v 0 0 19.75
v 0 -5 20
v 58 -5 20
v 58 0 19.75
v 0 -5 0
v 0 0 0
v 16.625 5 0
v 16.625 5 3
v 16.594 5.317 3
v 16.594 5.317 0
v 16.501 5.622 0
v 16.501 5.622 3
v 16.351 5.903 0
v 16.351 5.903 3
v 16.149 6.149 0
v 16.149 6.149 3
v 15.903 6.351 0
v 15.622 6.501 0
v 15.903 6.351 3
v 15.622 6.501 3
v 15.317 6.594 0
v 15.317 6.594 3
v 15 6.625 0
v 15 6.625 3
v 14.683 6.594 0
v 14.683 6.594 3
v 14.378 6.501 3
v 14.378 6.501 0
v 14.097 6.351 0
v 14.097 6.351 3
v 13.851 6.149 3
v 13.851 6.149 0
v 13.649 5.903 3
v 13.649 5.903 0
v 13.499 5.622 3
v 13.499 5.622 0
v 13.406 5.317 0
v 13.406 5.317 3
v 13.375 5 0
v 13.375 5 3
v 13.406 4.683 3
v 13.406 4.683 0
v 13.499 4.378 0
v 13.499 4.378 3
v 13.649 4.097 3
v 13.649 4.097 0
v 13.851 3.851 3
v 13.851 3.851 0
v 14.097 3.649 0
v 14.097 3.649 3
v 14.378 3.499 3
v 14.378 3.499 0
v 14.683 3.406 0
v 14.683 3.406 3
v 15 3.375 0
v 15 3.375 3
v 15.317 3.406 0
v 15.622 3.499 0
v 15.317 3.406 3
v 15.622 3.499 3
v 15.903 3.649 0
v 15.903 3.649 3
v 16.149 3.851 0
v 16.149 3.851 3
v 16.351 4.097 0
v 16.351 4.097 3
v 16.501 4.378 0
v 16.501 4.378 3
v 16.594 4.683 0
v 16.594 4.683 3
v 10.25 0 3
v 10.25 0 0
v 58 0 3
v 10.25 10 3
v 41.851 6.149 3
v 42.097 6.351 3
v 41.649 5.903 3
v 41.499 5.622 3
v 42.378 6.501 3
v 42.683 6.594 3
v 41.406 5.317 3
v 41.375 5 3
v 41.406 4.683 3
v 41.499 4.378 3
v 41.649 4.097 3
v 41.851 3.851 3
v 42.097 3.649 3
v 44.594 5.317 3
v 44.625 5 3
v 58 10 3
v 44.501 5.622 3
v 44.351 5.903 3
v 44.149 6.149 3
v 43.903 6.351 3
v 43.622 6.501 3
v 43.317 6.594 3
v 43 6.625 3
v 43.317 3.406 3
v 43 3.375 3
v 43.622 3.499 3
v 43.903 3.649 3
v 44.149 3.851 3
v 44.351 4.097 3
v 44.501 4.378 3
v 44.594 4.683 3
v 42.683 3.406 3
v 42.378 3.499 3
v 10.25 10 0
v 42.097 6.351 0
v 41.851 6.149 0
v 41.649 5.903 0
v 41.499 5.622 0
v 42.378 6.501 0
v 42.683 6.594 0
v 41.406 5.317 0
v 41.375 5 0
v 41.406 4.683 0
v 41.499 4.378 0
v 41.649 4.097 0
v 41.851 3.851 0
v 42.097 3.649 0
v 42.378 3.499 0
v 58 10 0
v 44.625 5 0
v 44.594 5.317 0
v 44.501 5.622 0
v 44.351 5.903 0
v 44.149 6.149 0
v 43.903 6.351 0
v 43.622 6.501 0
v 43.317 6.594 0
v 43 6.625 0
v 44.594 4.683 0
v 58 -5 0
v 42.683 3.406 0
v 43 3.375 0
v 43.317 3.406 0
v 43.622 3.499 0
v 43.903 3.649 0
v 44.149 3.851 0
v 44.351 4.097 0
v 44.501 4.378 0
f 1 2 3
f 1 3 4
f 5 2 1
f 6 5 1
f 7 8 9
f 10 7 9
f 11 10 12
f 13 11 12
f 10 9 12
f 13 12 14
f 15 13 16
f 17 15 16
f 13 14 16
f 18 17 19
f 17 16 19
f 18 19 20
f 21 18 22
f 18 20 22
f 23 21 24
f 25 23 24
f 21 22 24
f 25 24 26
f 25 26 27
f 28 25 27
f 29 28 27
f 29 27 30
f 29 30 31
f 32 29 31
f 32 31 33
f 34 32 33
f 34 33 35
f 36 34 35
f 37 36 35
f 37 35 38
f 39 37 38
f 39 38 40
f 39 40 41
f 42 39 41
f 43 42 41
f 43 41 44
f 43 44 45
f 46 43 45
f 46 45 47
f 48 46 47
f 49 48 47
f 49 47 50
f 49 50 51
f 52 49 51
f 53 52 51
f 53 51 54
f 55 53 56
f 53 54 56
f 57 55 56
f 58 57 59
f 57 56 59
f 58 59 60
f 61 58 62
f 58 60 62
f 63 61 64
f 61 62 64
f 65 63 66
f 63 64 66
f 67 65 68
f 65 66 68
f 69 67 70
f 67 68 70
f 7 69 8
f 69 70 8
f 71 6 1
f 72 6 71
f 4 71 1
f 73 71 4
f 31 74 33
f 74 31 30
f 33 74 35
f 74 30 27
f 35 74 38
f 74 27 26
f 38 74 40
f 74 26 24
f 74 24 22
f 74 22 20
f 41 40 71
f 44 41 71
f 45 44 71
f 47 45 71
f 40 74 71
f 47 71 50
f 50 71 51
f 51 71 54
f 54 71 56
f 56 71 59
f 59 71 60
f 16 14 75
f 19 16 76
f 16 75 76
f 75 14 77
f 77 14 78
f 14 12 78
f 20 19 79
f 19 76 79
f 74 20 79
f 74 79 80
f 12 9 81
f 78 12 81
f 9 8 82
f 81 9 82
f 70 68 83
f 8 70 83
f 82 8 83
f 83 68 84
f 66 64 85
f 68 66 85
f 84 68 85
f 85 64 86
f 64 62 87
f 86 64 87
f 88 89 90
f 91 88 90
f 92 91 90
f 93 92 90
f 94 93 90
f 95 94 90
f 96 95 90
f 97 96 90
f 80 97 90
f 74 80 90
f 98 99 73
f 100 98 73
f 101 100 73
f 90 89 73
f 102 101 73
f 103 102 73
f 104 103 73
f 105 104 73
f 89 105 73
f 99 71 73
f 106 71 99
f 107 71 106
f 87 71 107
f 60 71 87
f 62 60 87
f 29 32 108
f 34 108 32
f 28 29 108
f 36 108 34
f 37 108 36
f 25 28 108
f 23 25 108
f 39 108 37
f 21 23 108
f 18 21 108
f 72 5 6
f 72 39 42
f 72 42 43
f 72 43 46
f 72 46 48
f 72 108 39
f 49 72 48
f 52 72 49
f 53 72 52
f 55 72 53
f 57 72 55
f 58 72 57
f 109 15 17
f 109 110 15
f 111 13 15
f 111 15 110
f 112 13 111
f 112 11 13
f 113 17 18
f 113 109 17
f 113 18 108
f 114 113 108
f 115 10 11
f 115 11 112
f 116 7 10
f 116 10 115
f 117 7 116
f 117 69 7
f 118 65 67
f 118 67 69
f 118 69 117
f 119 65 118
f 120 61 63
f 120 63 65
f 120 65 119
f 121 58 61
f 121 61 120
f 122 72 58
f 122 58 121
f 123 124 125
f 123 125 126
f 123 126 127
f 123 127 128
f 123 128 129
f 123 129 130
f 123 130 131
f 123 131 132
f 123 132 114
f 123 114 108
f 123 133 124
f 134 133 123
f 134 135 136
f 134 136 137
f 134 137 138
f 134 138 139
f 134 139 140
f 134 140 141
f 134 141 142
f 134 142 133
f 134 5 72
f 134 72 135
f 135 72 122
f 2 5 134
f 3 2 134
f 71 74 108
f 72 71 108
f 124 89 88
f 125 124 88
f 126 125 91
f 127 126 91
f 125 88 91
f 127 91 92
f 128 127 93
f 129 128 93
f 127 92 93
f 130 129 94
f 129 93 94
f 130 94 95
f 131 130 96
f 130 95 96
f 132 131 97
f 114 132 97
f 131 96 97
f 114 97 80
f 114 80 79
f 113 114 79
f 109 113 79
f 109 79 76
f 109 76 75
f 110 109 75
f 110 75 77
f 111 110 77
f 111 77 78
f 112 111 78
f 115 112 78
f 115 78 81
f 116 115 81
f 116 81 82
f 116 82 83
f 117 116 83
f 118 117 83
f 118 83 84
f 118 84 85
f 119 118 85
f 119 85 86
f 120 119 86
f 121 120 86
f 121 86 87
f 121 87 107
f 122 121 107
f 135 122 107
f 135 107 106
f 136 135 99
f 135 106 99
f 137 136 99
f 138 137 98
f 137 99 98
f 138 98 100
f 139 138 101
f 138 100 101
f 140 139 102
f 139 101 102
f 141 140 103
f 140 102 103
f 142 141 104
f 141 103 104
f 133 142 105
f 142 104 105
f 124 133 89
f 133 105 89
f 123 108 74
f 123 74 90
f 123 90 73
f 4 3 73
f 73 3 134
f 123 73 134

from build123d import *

# Parameters (mm, degrees)
ESQUISSE1_W             = 58
ESQUISSE1_H             = 5
BOSS_EXTRU_1_DEPTH      = 20
ESQUISSE3_W             = 47.75
ESQUISSE3_H             = 3
BOSS_EXTRU_2_DEPTH      = 10
ESQUISSE4_R             = 1.625
ENL_V_MAT_EXTRU_1_DEPTH = 10
ENL_V_MAT_EXTRU_2_DEPTH = 59


with BuildPart() as part:
    # Esquisse1 → Boss.-Extru.1 (new body)
    with BuildSketch(Plane.XY):
        with Locations((29, -2.5)):
            Rectangle(ESQUISSE1_W, ESQUISSE1_H)
    extrude(amount=BOSS_EXTRU_1_DEPTH)

    # Esquisse3 → Boss.-Extru.2 (add)
    with BuildSketch(Plane(origin=(0, 0, 0), x_dir=(1, 0, 0), z_dir=(0, 1, 0))):
        with Locations((34.125, -1.5)):
            Rectangle(ESQUISSE3_W, ESQUISSE3_H)
    extrude(amount=BOSS_EXTRU_2_DEPTH)

    # Esquisse4 → Enlèv. mat.-Extru.1 (cut)
    with BuildSketch(Plane.XY.offset(3)):
        with Locations((43, 5)):
            Circle(ESQUISSE4_R)
        with Locations((15, 5)):
            Circle(ESQUISSE4_R)
    extrude(amount=-ENL_V_MAT_EXTRU_1_DEPTH, mode=Mode.SUBTRACT)

    # Esquisse6 → Enlèv. mat.-Extru.2 (cut, through all)
    with BuildSketch(Plane(origin=(58, 0, 0), x_dir=(0, 0, -1), z_dir=(1, 0, 0))):
        Polygon((-20, -5), (-19.75, 0), (-20, 0), align=None)
    extrude(amount=-ENL_V_MAT_EXTRU_2_DEPTH, mode=Mode.SUBTRACT)


solid = part.part
